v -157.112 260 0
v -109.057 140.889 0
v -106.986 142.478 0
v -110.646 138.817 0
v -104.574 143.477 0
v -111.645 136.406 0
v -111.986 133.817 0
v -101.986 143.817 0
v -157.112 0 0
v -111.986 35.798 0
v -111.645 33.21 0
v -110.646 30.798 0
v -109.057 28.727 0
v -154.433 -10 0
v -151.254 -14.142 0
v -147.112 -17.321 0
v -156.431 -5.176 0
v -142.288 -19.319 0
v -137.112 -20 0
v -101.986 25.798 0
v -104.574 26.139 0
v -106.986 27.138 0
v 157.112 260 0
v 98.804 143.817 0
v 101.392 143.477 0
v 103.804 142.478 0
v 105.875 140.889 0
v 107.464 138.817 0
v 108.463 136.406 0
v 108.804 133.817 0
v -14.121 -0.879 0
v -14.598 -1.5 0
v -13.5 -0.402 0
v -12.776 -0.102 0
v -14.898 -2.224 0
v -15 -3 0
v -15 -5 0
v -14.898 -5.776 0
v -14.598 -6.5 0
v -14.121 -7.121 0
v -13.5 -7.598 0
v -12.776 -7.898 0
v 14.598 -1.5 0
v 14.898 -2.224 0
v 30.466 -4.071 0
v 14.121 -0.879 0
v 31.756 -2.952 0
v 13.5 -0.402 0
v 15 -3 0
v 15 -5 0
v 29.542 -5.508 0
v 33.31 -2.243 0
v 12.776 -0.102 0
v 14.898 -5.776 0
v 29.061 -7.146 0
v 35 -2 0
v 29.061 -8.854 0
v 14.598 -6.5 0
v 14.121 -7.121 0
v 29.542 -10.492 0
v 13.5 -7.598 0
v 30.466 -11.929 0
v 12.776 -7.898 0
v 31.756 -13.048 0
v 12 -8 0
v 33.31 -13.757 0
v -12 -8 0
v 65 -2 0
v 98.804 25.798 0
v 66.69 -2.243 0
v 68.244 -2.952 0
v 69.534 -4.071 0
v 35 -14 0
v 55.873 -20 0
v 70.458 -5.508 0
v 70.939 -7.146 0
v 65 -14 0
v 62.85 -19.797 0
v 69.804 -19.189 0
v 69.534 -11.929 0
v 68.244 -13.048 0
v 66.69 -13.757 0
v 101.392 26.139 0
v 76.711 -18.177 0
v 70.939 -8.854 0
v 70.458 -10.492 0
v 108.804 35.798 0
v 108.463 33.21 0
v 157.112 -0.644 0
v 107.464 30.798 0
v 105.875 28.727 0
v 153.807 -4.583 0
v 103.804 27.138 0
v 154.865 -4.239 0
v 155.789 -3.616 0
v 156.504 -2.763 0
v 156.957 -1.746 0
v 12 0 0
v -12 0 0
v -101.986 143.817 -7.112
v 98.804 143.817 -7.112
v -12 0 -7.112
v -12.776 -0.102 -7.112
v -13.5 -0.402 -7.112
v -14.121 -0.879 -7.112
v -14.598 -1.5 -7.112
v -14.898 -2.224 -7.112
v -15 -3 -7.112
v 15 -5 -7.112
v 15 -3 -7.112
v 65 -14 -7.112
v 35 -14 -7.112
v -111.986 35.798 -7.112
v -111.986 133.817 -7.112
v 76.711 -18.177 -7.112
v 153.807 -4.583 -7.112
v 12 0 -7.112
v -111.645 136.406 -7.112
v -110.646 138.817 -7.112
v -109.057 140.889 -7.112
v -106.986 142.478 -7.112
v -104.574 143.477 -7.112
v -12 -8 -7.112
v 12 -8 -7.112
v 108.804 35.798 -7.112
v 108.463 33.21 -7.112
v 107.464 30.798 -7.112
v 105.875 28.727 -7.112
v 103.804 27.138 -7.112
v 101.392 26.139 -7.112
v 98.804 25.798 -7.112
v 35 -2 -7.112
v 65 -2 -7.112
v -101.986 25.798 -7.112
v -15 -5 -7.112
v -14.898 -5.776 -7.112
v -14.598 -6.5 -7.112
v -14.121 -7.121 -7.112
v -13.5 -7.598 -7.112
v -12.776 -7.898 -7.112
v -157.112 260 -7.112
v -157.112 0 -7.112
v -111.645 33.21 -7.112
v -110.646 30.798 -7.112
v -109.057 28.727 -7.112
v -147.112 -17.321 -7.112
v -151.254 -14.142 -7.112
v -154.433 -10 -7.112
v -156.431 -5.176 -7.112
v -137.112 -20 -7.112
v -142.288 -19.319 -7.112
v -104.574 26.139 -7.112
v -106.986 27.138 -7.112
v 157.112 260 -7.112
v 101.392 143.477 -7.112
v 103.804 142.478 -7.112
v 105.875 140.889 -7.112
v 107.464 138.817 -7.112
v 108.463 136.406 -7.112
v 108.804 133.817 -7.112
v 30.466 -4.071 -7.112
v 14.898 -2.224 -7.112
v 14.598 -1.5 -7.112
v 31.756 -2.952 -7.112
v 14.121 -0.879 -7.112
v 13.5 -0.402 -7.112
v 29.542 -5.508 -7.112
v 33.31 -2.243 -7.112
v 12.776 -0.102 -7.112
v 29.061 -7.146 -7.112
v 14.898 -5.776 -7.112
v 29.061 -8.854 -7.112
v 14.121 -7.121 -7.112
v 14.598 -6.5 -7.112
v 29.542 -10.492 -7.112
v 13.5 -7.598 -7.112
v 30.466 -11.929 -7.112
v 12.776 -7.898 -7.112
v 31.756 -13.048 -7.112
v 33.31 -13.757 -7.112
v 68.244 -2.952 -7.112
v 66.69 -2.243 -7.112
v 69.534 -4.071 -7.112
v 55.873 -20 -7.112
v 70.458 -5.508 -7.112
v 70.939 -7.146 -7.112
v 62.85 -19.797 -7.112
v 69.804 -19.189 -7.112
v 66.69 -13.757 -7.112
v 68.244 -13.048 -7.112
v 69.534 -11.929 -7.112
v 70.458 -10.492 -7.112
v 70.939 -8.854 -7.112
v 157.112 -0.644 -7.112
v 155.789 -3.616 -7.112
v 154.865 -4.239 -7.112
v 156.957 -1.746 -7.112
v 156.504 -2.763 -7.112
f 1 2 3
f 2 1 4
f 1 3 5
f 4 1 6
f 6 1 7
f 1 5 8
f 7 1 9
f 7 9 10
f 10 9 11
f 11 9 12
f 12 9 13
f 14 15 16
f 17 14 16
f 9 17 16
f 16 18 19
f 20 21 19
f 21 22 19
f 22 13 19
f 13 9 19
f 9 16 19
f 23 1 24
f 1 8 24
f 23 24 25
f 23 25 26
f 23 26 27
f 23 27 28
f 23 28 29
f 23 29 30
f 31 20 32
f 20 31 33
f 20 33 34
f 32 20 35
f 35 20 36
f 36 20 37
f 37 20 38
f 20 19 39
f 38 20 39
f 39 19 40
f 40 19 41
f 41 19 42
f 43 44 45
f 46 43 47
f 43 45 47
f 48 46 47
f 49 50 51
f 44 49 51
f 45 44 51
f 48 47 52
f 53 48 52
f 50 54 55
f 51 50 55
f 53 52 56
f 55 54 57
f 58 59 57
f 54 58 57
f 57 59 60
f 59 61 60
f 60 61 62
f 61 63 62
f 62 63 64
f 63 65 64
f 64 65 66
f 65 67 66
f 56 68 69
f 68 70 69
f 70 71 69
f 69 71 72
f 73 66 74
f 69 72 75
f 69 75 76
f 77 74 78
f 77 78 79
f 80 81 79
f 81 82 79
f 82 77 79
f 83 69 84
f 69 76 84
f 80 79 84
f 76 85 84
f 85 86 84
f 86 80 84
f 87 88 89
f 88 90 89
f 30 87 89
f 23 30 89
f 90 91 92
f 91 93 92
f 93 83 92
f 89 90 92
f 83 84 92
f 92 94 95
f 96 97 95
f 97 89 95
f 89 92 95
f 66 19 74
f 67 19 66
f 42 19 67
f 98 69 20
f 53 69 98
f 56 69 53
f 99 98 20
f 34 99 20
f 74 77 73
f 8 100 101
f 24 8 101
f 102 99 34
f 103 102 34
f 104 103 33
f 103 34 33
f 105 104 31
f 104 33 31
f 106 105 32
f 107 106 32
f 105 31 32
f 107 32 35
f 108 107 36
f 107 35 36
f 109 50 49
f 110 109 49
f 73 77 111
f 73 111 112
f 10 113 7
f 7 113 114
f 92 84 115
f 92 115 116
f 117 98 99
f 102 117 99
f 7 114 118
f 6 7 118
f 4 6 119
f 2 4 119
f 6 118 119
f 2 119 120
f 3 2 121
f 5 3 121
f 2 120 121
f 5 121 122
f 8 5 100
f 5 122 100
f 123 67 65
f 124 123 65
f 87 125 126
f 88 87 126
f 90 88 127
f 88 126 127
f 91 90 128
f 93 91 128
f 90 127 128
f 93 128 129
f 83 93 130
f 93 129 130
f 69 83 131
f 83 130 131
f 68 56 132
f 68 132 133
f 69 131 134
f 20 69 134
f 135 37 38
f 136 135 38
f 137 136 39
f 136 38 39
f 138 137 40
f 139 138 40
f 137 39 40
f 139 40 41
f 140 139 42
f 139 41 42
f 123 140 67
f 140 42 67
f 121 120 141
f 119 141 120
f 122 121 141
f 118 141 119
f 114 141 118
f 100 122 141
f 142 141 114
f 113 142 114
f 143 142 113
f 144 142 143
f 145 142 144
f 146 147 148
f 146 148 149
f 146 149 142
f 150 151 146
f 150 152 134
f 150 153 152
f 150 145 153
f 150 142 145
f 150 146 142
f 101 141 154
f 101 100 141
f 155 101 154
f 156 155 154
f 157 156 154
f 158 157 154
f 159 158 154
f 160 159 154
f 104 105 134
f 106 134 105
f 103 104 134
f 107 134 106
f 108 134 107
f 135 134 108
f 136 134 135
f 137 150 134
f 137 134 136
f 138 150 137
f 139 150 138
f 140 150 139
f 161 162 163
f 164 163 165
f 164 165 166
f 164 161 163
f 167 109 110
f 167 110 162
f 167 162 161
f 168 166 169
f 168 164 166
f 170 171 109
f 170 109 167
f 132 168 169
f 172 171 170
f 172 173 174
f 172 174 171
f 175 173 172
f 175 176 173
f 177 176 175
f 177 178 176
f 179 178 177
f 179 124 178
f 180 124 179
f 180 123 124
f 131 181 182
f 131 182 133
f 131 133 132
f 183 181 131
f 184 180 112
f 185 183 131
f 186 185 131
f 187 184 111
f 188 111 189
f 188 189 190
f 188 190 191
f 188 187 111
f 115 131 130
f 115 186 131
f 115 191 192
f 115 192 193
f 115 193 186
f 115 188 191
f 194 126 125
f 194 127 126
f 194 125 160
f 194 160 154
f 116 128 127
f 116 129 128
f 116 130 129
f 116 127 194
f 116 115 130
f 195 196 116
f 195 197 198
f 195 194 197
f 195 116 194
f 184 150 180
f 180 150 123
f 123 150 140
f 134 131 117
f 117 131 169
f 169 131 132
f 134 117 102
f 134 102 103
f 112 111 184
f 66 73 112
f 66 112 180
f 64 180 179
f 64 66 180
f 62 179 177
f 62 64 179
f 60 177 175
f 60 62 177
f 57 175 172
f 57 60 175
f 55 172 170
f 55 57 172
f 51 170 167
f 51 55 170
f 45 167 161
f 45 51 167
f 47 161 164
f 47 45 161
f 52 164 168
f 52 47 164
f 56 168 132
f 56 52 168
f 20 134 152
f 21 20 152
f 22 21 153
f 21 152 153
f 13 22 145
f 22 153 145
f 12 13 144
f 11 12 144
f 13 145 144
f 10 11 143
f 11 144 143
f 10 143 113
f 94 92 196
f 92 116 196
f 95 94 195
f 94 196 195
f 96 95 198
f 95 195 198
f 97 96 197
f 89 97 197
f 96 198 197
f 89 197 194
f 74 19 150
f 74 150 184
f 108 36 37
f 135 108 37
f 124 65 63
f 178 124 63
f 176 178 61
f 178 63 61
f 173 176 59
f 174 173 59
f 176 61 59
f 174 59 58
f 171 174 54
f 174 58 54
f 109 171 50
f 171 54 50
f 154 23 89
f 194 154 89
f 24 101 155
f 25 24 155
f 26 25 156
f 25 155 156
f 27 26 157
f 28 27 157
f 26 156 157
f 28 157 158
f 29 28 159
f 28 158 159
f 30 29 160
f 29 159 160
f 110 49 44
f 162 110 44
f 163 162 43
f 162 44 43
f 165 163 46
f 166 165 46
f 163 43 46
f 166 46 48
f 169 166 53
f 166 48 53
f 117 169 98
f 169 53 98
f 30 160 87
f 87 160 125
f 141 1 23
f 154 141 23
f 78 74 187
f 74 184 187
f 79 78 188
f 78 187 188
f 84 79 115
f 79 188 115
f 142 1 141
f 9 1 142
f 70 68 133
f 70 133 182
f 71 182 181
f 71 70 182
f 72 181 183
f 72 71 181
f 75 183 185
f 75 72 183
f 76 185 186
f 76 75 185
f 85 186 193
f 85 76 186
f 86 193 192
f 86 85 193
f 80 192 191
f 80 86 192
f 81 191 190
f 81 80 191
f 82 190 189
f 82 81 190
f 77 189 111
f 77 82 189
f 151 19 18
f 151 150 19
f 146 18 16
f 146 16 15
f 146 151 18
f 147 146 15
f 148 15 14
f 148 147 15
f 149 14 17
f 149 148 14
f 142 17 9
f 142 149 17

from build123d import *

# Parameters (mm, degrees)
SKETCH1_W               = 314.224
SKETCH1_H               = 280
BOSS_EXTRUDE1_DEPTH     = 7.112
CUT_EXTRUDE1_DEPTH      = 304.866353991
CUT_EXTRUDE1_DEPTH_BACK = 304.866353991
CUT_EXTRUDE2_DEPTH      = 304.866353991
CUT_EXTRUDE3_DEPTH      = 304.866353991
FILLET1_R               = 120
FILLET2_R               = 20
FILLET3_R               = 4
CUT_EXTRUDE4_DEPTH      = 304.866353991


with BuildPart() as part:
    # Sketch1 → Boss-Extrude1 (new body)
    with BuildSketch(Plane(origin=(0, 0, 0), x_dir=(1, 0, 0), z_dir=(0, 0, -1))):
        with Locations((0, -120)):
            Rectangle(SKETCH1_W, SKETCH1_H)
    extrude(amount=BOSS_EXTRUDE1_DEPTH)

    # Sketch2 → Cut-Extrude1 (cut, two sides: drawn at the far end of the back side and taken through both)
    with BuildSketch(Plane.XY.offset(-CUT_EXTRUDE1_DEPTH_BACK)):
        with BuildLine():
            Line((-101.985505074, 143.817457954), (98.803851758, 143.817457954))
            ThreePointArc((98.803851758, 143.817457954), (105.87491957, 140.888525766), (108.803851758, 133.817457954))
            Line((108.803851758, 133.817457954), (108.803851758, 35.797968831))
            ThreePointArc((108.803851758, 35.797968831), (105.87491957, 28.726901019), (98.803851758, 25.797968831))
            Line((98.803851758, 25.797968831), (-101.985505074, 25.797968831))
            ThreePointArc((-101.985505074, 25.797968831), (-109.056572886, 28.726901019), (-111.985505074, 35.797968831))
            Line((-111.985505074, 35.797968831), (-111.985505074, 133.817457954))
            ThreePointArc((-111.985505074, 133.817457954), (-109.056572886, 140.888525766), (-101.985505074, 143.817457954))
        make_face()
    extrude(amount=CUT_EXTRUDE1_DEPTH + CUT_EXTRUDE1_DEPTH_BACK, mode=Mode.SUBTRACT)

    # Sketch3 → Cut-Extrude2 (cut, through all)
    with BuildSketch(Plane.XY):
        with BuildLine():
            Line((-12, -8), (12, -8))
            ThreePointArc((12, -8), (14.121320344, -7.121320344), (15, -5))
            Line((15, -5), (15, -3))
            ThreePointArc((15, -3), (14.121320344, -0.878679656), (12, 0))
            Line((12, 0), (-12, 0))
            ThreePointArc((-12, 0), (-14.121320344, -0.878679656), (-15, -3))
            Line((-15, -3), (-15, -5))
            ThreePointArc((-15, -5), (-14.121320344, -7.121320344), (-12, -8))
        make_face()
    extrude(amount=-CUT_EXTRUDE2_DEPTH, mode=Mode.SUBTRACT)

    # Sketch4 → Cut-Extrude3 (cut, through all)
    with BuildSketch(Plane.XY):
        Polygon((66.371490886, -20), (157.112, -4), (157.112, -20), align=None)
    extrude(amount=-CUT_EXTRUDE3_DEPTH, mode=Mode.SUBTRACT)

    # Fillet1
    fillet1_edges = [part.edges().sort_by_distance(p)[0] for p in [
        (66.371490886, -20, -3.556),
    ]]
    fillet(fillet1_edges, radius=FILLET1_R)

    # Fillet2
    fillet2_edges = [part.edges().sort_by_distance(p)[0] for p in [
        (-157.112, -20, -3.556),
    ]]
    fillet(fillet2_edges, radius=FILLET2_R)

    # Fillet3
    fillet3_edges = [part.edges().sort_by_distance(p)[0] for p in [
        (157.112, -4, -3.556),
    ]]
    fillet(fillet3_edges, radius=FILLET3_R)

    # Sketch5 → Cut-Extrude4 (cut, through all)
    with BuildSketch(Plane.XY):
        with BuildLine():
            Line((35, -2), (65, -2))
            ThreePointArc((65, -2), (71, -8), (65, -14))
            Line((65, -14), (35, -14))
            ThreePointArc((35, -14), (29, -8), (35, -2))
        make_face()
    extrude(amount=-CUT_EXTRUDE4_DEPTH, mode=Mode.SUBTRACT)


solid = part.part
